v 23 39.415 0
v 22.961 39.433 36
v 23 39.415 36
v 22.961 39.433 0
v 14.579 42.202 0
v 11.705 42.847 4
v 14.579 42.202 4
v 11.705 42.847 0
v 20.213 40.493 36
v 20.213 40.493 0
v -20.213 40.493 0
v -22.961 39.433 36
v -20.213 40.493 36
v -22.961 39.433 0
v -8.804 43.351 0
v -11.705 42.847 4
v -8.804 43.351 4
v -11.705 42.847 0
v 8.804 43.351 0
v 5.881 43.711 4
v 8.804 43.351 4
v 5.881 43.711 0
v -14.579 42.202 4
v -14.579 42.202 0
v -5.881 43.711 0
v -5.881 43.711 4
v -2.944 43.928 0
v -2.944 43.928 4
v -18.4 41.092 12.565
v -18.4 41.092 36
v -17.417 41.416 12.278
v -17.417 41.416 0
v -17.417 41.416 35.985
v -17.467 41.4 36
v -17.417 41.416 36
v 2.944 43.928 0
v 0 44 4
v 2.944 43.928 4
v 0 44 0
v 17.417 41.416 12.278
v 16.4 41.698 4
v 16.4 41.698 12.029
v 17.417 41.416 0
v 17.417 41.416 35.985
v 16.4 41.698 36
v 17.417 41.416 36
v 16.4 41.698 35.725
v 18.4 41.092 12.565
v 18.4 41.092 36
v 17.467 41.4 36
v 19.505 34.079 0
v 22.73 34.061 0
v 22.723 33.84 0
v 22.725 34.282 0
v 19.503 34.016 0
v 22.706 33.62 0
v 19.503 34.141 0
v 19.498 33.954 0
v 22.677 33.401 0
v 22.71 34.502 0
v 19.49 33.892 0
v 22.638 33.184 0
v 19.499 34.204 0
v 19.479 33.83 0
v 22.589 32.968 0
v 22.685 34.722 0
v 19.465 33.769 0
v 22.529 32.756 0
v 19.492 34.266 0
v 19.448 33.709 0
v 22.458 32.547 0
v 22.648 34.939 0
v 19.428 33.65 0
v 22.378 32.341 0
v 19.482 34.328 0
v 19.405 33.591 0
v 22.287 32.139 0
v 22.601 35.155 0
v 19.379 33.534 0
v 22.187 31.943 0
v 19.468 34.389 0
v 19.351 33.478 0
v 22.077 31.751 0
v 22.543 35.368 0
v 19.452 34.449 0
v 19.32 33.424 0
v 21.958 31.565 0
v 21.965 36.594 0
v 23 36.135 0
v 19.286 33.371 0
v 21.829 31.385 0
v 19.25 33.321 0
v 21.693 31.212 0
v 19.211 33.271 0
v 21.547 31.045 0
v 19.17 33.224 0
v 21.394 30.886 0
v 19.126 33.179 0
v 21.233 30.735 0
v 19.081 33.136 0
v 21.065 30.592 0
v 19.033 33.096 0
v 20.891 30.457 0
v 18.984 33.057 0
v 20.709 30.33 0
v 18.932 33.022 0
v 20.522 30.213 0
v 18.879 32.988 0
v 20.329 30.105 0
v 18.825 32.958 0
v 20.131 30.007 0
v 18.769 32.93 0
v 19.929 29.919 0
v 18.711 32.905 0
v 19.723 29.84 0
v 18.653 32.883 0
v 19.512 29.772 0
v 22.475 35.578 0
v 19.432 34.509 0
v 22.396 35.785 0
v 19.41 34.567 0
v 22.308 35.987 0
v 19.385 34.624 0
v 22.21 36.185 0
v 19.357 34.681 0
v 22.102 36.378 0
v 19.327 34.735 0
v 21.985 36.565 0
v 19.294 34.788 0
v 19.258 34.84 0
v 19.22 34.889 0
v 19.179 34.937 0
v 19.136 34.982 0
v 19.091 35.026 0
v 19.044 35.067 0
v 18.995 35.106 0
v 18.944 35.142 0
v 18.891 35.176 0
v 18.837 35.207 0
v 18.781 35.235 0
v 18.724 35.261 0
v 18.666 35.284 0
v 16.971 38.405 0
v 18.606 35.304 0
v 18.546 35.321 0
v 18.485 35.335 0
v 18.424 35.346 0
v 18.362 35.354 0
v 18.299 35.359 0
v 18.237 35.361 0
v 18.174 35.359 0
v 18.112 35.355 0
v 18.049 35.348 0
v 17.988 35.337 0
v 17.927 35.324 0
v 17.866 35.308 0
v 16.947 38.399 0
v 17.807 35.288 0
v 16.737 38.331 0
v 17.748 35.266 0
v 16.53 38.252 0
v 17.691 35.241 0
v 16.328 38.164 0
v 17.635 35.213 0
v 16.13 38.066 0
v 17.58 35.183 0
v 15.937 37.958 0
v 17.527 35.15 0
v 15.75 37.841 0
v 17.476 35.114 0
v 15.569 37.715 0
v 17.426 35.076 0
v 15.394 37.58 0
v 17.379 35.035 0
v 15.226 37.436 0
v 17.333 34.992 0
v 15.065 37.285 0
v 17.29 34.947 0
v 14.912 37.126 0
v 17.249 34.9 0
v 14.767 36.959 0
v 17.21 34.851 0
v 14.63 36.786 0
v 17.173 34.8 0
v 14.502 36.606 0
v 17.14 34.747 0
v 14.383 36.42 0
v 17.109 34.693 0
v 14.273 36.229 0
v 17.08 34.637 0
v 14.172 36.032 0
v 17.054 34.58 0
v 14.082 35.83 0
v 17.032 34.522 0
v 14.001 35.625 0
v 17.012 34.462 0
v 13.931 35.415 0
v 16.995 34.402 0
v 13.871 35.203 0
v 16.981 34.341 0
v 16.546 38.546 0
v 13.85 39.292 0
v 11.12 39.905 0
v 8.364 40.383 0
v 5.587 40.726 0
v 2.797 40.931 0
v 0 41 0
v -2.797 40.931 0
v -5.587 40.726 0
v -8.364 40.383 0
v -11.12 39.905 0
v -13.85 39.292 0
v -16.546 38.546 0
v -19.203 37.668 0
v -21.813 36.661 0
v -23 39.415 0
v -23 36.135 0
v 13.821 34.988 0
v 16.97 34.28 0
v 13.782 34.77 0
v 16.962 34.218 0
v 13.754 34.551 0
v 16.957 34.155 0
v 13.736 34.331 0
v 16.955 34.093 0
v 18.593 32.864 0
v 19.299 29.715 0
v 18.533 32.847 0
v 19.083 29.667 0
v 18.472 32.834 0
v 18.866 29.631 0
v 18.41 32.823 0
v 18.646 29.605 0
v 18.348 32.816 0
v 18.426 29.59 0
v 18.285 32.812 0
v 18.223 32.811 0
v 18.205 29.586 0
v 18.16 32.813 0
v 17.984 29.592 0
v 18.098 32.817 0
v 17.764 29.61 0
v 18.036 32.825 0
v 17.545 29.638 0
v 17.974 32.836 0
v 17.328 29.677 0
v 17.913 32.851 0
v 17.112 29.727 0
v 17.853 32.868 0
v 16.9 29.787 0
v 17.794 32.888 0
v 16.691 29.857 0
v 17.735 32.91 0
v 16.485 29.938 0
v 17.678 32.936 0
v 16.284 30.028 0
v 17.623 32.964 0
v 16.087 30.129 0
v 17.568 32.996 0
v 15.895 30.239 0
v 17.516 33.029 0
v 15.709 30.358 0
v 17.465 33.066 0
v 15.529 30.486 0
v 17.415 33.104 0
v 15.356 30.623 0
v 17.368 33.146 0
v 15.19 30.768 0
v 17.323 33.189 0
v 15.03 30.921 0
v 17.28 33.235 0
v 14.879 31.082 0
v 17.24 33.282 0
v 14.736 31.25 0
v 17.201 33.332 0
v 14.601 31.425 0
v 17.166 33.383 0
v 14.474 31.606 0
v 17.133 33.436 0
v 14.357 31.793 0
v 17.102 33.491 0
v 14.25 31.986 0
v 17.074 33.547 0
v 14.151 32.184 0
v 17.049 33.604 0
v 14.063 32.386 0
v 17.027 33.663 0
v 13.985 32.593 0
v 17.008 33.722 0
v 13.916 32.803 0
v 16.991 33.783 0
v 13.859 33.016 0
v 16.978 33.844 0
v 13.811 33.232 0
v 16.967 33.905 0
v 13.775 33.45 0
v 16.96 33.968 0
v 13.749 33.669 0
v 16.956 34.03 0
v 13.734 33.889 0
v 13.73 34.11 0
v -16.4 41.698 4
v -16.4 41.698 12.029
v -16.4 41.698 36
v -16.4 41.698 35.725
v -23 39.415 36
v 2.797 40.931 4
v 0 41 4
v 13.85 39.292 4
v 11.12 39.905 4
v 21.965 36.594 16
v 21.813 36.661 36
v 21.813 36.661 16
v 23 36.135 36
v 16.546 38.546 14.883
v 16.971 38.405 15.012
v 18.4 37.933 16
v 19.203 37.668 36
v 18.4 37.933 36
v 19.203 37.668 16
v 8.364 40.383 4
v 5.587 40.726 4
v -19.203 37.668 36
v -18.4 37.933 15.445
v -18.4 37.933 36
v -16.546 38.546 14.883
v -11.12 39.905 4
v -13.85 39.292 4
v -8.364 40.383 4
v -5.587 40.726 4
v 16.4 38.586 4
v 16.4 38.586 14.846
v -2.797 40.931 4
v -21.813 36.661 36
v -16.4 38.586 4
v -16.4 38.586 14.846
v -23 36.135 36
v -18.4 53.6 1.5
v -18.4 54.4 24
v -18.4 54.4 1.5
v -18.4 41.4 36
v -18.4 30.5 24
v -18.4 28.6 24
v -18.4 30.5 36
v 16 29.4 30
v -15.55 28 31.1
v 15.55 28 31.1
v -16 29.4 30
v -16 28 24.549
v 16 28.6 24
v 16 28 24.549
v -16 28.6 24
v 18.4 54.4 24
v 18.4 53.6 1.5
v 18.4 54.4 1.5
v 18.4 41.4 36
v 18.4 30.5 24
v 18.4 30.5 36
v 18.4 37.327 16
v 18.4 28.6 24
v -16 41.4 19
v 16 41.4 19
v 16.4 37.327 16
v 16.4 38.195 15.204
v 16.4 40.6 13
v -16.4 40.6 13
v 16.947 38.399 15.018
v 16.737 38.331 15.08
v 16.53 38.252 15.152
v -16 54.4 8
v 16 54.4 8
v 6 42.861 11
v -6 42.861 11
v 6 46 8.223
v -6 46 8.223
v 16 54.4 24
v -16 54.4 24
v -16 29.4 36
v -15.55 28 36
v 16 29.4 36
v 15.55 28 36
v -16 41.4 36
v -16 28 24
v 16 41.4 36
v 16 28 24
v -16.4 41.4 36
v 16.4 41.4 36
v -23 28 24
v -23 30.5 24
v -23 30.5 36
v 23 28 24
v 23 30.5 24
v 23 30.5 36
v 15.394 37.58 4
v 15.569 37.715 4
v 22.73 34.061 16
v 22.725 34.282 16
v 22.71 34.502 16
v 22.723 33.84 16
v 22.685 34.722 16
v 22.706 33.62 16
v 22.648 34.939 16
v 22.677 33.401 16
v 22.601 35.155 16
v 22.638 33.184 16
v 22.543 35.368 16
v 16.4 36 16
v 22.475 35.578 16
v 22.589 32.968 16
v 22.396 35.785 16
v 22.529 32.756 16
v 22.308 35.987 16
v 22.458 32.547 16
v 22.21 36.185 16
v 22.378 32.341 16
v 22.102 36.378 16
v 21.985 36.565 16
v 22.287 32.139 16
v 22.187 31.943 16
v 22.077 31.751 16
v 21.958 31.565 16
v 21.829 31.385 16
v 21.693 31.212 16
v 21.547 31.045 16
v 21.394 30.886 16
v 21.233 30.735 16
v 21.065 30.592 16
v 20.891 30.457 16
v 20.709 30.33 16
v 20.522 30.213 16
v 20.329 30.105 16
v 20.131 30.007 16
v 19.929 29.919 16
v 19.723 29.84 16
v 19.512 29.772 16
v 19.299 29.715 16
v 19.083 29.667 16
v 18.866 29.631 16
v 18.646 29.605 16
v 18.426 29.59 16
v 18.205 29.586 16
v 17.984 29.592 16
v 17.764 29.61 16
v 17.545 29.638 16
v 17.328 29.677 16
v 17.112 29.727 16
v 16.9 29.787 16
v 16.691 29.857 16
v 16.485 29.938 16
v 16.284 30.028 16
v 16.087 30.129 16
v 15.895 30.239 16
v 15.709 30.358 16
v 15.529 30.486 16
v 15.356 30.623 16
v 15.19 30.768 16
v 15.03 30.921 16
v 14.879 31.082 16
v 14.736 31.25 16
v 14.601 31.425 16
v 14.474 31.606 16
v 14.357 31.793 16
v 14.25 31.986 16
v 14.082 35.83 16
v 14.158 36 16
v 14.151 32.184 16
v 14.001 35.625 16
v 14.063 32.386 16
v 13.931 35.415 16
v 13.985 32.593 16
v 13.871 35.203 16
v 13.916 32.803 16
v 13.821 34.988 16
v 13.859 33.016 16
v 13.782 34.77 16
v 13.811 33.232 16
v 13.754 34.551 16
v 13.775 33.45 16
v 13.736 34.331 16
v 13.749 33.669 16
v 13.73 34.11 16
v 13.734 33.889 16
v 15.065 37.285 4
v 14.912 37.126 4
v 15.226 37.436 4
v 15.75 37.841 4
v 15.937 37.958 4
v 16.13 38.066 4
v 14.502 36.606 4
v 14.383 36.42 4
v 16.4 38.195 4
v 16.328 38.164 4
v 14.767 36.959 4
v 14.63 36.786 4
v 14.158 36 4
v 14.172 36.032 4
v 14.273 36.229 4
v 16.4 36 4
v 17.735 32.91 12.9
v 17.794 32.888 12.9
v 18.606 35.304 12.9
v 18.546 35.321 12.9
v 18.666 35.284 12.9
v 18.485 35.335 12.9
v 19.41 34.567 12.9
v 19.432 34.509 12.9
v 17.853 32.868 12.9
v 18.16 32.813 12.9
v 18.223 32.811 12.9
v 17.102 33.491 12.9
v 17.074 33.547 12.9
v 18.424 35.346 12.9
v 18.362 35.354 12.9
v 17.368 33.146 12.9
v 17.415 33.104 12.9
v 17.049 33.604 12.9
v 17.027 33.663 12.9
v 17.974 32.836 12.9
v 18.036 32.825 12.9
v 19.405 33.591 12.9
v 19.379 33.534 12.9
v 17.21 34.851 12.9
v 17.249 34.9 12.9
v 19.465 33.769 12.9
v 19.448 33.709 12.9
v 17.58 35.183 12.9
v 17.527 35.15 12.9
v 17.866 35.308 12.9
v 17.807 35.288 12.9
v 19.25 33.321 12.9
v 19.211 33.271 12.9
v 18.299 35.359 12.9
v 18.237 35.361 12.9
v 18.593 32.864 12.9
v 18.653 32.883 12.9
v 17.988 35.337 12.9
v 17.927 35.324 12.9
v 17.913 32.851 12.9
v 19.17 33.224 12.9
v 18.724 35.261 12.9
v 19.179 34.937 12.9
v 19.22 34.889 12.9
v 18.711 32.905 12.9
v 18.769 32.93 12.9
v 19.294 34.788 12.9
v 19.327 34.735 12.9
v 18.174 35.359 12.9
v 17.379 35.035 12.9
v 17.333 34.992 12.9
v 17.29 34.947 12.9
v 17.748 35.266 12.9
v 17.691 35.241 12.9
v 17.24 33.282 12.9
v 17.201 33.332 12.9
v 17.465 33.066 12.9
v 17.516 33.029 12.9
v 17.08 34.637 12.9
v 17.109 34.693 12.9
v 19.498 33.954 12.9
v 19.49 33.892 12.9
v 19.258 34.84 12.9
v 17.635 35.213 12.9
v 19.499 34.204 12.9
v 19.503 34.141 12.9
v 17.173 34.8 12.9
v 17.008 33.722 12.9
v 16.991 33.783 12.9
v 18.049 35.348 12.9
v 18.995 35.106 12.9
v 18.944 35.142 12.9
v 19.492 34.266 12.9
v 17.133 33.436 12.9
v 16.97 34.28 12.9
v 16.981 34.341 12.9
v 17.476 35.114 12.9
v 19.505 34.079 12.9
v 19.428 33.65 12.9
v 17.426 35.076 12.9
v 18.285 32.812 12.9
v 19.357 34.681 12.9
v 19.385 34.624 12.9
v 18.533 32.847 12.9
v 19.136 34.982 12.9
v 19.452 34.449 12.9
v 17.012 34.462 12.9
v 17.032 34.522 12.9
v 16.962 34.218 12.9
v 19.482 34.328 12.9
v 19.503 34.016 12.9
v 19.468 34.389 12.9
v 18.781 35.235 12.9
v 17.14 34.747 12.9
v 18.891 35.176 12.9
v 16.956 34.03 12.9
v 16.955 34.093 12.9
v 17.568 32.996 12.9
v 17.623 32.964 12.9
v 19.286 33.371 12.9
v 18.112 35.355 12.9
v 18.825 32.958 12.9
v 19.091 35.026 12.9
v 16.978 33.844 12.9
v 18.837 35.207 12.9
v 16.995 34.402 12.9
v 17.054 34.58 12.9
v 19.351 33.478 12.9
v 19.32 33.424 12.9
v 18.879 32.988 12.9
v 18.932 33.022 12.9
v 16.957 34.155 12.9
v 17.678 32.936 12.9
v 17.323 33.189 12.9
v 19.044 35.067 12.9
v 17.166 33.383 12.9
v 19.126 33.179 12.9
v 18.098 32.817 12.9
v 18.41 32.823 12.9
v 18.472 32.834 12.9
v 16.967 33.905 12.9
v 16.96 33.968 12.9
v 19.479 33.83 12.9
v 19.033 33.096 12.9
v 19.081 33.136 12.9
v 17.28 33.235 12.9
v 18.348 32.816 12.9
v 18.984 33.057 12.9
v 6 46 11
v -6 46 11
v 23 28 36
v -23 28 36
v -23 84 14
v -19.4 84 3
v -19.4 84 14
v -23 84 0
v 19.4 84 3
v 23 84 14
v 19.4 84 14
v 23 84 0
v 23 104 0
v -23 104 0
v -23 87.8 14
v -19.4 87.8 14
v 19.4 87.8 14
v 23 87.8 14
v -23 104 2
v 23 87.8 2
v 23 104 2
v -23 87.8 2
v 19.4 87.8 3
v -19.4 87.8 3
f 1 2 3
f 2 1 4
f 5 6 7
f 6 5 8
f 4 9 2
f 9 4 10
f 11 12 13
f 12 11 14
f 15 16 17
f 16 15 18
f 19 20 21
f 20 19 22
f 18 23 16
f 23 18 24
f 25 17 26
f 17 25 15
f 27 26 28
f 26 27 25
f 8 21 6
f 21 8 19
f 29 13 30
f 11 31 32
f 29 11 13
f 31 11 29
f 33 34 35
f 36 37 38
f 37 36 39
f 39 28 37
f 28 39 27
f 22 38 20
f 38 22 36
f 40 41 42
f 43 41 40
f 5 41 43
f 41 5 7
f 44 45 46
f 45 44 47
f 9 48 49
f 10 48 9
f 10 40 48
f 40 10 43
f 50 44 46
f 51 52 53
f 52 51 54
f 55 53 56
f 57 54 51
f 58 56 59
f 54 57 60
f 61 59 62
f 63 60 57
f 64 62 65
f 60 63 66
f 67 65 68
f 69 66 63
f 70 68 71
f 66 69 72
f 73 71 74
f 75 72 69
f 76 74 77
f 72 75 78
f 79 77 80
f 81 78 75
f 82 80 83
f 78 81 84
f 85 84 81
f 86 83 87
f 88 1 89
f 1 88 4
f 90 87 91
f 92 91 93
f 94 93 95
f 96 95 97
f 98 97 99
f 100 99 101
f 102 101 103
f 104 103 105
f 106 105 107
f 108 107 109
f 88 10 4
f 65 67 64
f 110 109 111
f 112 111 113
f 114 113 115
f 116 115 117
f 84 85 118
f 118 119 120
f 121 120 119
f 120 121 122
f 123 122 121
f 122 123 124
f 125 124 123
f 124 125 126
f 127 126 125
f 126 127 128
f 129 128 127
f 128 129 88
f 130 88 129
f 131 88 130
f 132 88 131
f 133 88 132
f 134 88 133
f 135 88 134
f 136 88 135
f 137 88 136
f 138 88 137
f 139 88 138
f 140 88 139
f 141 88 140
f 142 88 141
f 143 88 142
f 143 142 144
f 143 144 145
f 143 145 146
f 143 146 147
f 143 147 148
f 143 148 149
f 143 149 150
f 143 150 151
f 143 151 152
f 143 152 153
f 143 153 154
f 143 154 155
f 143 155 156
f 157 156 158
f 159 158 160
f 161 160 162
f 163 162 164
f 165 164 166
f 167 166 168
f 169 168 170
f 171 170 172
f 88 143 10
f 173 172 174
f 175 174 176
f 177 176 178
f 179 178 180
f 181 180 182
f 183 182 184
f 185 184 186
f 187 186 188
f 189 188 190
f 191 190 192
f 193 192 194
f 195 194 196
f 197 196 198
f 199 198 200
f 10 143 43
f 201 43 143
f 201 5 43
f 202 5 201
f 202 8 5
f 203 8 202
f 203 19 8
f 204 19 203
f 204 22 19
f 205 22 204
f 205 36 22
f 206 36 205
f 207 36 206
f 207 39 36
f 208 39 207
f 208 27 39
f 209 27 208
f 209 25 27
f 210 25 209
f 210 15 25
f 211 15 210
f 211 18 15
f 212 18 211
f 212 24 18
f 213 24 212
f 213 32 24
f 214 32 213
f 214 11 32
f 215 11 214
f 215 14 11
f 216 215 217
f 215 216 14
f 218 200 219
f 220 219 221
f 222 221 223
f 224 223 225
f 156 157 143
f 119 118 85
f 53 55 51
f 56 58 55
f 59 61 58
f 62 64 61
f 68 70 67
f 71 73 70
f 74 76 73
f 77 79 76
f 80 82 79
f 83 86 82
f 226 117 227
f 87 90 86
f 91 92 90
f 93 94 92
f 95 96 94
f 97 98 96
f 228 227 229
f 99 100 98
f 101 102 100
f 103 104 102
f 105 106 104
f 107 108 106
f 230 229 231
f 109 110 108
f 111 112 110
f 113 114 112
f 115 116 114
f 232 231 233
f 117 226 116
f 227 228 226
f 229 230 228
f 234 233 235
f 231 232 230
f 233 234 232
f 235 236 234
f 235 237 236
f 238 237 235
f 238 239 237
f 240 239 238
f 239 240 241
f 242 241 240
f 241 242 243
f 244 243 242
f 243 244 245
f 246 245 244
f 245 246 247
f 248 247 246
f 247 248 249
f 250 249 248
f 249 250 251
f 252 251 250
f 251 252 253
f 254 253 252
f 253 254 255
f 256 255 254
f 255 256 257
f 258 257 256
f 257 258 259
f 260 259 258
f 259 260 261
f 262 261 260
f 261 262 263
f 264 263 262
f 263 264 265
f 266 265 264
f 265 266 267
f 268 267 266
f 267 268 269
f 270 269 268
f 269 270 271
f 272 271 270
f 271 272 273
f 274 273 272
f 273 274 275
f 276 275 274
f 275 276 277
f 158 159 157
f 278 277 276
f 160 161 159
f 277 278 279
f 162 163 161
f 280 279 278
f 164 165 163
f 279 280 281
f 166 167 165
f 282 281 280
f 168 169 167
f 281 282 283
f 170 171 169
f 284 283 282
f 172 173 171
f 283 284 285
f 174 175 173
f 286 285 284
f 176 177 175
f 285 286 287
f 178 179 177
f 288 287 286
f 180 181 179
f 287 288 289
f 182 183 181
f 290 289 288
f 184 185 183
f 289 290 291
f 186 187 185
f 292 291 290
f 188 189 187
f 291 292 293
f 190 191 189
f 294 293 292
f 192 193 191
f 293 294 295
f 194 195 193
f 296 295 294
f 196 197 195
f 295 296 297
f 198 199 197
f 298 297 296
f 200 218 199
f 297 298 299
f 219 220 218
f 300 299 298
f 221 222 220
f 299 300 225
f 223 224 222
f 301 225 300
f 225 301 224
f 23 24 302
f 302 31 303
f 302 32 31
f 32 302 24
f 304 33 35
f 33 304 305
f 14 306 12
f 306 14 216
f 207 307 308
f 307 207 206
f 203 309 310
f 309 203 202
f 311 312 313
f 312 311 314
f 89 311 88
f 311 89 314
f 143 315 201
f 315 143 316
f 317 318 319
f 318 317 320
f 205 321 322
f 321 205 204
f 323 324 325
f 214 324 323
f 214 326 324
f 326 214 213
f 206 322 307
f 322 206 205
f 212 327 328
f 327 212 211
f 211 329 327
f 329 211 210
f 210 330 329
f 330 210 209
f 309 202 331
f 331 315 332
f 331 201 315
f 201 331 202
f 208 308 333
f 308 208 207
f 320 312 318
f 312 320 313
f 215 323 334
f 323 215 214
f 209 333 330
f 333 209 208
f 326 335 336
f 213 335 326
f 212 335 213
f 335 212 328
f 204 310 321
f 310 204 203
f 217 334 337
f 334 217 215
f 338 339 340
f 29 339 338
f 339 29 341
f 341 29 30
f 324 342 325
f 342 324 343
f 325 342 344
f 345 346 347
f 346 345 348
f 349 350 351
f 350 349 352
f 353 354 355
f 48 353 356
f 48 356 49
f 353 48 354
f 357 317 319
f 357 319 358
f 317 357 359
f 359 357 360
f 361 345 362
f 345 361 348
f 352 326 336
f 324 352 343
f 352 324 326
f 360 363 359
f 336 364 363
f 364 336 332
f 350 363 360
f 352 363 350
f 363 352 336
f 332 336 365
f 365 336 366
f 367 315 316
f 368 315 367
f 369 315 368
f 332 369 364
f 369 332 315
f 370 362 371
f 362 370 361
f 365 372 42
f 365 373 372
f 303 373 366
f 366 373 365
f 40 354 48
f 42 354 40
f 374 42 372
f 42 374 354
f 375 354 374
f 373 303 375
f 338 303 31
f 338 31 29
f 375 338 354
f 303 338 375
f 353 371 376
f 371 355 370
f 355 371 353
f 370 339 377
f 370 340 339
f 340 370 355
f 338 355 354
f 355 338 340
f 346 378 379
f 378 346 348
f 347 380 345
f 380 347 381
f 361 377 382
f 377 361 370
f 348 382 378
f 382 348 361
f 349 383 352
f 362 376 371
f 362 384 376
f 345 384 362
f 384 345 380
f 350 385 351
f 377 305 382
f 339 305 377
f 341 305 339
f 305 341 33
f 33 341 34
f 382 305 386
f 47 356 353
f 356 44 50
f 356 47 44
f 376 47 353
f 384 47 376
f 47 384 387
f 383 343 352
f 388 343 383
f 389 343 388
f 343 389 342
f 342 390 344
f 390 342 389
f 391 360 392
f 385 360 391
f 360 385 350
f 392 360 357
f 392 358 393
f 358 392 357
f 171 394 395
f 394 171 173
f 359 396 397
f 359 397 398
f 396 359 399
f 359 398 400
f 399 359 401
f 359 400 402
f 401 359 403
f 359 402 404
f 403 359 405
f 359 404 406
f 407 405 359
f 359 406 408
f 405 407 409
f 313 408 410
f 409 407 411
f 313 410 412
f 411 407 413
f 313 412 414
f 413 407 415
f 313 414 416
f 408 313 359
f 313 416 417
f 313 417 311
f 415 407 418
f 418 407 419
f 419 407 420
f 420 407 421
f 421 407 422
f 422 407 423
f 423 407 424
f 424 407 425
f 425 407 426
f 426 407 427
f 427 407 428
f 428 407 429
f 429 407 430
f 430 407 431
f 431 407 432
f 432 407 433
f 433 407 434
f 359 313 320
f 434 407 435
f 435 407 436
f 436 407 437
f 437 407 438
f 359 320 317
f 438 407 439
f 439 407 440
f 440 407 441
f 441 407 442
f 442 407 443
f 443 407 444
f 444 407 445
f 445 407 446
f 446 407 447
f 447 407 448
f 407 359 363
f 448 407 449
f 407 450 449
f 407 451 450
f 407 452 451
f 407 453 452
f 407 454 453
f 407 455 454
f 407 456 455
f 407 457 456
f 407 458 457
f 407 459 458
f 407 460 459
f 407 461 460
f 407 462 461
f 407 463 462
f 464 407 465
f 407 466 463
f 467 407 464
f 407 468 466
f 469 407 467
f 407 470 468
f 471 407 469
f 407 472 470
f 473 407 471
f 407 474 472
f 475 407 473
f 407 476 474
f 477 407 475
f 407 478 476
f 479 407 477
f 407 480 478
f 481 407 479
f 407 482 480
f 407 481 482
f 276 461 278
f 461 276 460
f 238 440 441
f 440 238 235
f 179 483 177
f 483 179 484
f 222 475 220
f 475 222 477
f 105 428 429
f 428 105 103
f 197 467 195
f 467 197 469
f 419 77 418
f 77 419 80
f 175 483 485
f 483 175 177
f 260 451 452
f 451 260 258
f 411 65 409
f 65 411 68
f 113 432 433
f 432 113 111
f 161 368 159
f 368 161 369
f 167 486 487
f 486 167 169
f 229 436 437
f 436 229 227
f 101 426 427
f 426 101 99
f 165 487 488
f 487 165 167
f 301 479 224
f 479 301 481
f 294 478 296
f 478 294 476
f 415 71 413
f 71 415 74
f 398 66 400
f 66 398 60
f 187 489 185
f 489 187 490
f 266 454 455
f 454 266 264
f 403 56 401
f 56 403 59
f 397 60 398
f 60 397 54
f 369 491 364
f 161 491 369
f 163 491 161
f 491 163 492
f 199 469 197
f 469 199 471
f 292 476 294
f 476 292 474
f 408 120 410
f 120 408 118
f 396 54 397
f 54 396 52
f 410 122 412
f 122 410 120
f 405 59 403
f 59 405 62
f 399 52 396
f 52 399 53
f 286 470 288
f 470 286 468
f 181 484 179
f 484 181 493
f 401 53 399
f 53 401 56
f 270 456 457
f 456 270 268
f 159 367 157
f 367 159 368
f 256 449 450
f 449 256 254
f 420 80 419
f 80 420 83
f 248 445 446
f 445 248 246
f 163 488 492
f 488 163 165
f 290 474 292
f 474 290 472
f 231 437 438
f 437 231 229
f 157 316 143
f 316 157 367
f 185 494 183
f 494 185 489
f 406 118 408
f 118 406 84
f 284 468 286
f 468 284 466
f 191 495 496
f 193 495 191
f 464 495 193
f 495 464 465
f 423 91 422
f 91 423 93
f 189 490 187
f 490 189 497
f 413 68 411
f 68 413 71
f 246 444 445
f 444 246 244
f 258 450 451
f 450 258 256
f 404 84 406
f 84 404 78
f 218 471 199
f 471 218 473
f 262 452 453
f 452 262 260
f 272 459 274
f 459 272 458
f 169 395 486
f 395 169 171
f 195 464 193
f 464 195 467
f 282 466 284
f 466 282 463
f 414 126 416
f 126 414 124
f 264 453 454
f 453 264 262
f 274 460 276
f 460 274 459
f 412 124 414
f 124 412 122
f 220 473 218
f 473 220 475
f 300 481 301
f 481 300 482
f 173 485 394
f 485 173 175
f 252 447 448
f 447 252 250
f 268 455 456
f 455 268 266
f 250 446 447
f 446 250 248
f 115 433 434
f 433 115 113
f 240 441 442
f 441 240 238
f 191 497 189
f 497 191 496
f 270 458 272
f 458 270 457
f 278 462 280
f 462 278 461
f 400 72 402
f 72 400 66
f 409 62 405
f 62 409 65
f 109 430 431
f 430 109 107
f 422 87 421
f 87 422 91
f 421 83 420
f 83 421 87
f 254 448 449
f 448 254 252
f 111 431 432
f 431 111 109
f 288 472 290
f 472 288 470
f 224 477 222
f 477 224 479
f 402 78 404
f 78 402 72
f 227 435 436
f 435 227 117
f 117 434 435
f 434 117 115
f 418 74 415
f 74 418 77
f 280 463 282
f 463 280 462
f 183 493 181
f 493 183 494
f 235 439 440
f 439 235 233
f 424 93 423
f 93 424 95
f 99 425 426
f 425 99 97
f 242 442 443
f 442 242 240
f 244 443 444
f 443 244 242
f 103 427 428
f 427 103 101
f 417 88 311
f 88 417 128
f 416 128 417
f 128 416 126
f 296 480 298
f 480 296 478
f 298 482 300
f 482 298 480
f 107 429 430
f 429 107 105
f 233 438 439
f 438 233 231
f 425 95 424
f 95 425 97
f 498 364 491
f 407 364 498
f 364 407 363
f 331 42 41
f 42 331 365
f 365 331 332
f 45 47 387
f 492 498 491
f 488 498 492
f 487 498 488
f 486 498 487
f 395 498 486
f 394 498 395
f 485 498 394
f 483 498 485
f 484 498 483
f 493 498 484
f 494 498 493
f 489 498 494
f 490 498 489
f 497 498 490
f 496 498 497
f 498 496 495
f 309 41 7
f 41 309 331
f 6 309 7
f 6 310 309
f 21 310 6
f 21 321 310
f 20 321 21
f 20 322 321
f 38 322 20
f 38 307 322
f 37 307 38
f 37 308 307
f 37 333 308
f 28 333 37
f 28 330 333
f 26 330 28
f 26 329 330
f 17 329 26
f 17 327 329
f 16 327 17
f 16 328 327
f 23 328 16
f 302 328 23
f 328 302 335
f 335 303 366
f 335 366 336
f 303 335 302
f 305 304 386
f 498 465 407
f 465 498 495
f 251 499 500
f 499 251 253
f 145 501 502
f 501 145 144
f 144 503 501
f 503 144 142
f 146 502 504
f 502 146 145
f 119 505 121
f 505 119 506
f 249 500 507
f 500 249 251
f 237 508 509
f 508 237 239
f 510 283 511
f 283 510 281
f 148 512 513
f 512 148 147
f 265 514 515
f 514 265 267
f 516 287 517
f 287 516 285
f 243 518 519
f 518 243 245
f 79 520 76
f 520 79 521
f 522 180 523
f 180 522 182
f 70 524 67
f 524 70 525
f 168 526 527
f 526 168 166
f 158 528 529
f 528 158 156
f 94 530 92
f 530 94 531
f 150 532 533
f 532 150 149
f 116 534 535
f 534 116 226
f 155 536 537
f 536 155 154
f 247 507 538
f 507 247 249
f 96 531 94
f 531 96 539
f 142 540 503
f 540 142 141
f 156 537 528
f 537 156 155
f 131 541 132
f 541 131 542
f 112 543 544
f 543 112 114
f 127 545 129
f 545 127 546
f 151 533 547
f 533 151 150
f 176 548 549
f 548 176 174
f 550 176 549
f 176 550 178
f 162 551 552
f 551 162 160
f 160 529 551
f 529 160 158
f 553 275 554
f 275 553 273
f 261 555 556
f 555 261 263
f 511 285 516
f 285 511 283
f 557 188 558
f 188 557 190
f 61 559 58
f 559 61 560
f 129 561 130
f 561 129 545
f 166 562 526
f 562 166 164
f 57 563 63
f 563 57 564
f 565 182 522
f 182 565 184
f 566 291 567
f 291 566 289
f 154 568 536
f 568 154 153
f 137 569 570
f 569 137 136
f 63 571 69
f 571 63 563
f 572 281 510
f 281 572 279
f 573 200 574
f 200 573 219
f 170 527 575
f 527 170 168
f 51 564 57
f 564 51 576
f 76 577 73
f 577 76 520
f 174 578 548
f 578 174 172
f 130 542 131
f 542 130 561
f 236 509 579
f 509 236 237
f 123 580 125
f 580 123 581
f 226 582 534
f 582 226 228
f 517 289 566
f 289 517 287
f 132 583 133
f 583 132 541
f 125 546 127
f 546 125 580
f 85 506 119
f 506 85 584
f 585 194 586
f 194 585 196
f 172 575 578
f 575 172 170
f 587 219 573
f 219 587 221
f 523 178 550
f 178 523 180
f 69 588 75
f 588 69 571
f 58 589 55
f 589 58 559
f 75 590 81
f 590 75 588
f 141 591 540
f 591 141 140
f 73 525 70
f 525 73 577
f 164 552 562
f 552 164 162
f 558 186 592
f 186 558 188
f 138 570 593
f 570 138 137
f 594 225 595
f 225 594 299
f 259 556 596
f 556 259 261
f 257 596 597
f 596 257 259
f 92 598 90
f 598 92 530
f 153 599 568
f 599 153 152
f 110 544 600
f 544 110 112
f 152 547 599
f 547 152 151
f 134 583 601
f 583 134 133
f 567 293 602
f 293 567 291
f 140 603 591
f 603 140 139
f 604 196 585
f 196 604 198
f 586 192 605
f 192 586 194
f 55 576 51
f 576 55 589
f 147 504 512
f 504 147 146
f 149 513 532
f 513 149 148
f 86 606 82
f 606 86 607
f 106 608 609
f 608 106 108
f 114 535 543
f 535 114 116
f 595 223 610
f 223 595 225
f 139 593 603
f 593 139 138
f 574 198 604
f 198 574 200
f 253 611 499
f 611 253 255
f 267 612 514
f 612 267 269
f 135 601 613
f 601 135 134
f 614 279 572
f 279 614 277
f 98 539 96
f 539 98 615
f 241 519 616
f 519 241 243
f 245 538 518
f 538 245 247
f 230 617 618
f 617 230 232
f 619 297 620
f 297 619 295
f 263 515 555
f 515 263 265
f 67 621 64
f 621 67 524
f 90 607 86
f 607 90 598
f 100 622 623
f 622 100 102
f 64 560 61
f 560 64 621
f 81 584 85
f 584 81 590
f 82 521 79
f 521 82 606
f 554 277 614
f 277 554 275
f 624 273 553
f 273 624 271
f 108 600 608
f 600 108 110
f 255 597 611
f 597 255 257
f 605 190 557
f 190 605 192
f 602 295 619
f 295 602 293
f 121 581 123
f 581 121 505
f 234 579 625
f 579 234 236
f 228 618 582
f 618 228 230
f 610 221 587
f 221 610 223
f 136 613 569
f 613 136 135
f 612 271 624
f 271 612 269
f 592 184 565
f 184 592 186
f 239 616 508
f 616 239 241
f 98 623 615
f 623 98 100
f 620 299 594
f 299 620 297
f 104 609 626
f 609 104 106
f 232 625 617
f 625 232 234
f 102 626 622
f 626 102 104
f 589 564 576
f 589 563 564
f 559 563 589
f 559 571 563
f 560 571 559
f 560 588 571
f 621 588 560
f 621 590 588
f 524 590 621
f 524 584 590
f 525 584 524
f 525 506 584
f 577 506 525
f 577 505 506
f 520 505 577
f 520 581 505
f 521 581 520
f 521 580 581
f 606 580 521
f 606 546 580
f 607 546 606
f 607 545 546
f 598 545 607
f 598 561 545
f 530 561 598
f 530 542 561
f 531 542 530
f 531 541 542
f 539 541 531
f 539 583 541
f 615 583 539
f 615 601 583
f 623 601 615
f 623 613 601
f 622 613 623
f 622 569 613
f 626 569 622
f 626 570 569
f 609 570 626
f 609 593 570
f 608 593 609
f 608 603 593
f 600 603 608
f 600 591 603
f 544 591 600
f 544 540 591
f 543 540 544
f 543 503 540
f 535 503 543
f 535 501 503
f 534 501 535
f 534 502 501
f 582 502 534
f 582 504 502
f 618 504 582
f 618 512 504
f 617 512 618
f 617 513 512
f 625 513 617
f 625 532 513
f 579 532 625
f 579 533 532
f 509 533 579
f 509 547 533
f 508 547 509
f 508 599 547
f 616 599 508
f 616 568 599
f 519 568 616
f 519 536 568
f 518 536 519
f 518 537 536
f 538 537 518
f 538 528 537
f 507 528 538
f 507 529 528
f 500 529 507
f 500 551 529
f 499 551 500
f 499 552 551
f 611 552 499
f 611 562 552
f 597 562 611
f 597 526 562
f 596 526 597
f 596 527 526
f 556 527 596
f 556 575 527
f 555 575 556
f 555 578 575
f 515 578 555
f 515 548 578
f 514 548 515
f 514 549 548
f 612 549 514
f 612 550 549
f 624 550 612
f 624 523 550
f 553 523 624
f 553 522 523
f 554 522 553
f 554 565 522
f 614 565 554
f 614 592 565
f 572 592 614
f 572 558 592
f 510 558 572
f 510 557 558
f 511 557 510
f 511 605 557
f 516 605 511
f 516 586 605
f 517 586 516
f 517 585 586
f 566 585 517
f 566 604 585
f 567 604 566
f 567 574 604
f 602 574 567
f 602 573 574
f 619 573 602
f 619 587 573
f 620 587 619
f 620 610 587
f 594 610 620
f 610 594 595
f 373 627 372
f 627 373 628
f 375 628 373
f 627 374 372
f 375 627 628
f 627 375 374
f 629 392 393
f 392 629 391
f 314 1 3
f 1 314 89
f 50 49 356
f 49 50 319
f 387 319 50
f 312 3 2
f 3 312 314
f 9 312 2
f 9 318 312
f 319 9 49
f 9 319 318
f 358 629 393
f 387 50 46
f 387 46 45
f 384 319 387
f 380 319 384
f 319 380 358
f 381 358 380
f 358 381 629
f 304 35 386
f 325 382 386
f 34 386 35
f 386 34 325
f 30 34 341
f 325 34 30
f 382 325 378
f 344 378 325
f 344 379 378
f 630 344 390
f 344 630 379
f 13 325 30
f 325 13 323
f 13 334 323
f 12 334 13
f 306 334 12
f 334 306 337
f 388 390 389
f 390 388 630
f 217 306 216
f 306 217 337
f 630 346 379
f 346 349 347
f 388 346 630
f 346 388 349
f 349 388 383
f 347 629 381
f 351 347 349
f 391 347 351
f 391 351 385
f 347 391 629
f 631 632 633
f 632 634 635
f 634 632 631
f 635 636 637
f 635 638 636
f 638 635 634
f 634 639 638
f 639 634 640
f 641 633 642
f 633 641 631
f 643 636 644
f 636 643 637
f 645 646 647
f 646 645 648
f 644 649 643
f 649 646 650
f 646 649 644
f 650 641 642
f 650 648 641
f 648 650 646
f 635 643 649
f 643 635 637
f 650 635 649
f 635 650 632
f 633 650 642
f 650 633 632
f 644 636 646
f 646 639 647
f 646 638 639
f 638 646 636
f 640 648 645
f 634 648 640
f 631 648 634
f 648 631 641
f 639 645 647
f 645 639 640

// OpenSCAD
// file: part_f3_catch_tray.scad
// ============================================================================
// v3 PART F3 — catch tray, mouth flush with the chute walls
//
// The mouth wall is cut down so the chute lip overhangs into the well with no
// step for a tablet to catch on. Free-standing: lift it out to take the dose.
// Its flat floor is the camera's pill-count zone, so keep it matte.
// ============================================================================

include <parameters_v3.scad>;
include <lib_v3.scad>;

$fn = 64;

corner_r = 6.0;

module f3_shell(inset, h, z0) {
    x = tray_w - 2 * inset;
    y = tray_l - 2 * inset;
    translate([0, tray_y0 + tray_l / 2, z0])
        hull() for (ix = [-1, 1], iy = [-1, 1])
            translate([ix * (x / 2 - corner_r), iy * (y / 2 - corner_r), 0])
                cylinder(h = h, r = corner_r);
}

module catch_tray_v3() {
    difference() {
        f3_shell(0, tray_h, base_z);
        f3_shell(tray_floor + 1.8, tray_h, base_z + tray_floor);
        // Cut the mouth wall down to clear the chute lip.
        translate([-(chute_win_w / 2 + 3), tray_y0 - 1, base_z + tray_mouth_h])
            cube([chute_win_w + 6, 6, tray_h]);
    }
}

translate([0, 0, -base_z]) catch_tray_v3();

echo(str("F3 tray: ", tray_w, " x ", tray_l, " x ", tray_h,
         ", mouth wall ", tray_mouth_h, " mm vs chute lip at z ",
         chute_stations[len(chute_stations) - 1][1]));
// file: part_b3_base_body.scad
// ============================================================================
// v3 PART B3 — base body (lower): electronics bay + integral 45 deg chute
//
// Splitting the housing here is what makes both halves printable: this one goes
// open-end-down, so the chute floor and the wall notch are all self-supporting.
//
// The ramp is one continuous surface from under the deck's wedge to the lip over
// the tray: the stations are hulled in sequence, and the notch through the wall
// is cut with its sill on the ramp line so it never breaches the floor.
// ============================================================================

include <parameters_v3.scad>;
include <lib_v3.scad>;

$fn = 128;

n_st = len(chute_stations);

module b3_floor_station(st) {
    w = st[2] + 2 * chute_wall;
    translate([-w / 2, st[0] - 0.4, st[1] - st[4]])
        cube([w, 0.8, st[4]]);
}

module b3_wall_station(st, side) {
    h = max(0.8, st[3] - st[1]);
    mirror([side < 0 ? 1 : 0, 0, 0])
        translate([st[2] / 2, st[0] - 0.4, st[1]]) cube([chute_wall, 0.8, h]);
}

// The ramp, as one continuous surface from under the deck's wedge to the lip.
module b3_chute_floor() {
    for (i = [0 : n_st - 2]) hull() {
        b3_floor_station(chute_stations[i]);
        b3_floor_station(chute_stations[i + 1]);
    }
}

module b3_chute_walls() {
    for (i = [0 : n_st - 2], s = [-1, 1]) hull() {
        b3_wall_station(chute_stations[i], s);
        b3_wall_station(chute_stations[i + 1], s);
    }
}

// The notch is a box MINUS the chute itself, so it can only ever remove housing
// wall — the ramp and the chute's side walls survive whatever the box does.
// A plain box (the first attempt) sliced the ramp out exactly where it passes
// through the wall and left a hole a tablet dropped through. Putting the box's
// sill on the ramp line closed the hole but made the cut coplanar with the
// ramp's own top surface, which is fragile; subtracting the chute is exact.
module b3_wall_notch(w, z0, z_top) {
    difference() {
        translate([-w / 2, h_ri - 5, z0])
            cube([w, (h_od / 2 + 4) - (h_ri - 5), z_top - z0]);
        b3_chute_floor();
        b3_chute_walls();
    }
}

// Shoulder fins tying the chute back into the bore. They also stiffen the wall
// either side of the notch. Below the deck, so they cannot foul the carousel.
module b3_shoulder(side) {
    st = chute_stations[1];
    mirror([side < 0 ? 1 : 0, 0, 0])
        intersection() {
            translate([st[2] / 2, st[0] - 1.5, st[1] - st[4]])
                cube([30, 3.0, st[3] - st[1] + st[4]]);
            cylinder(h = deck_z, d = h_id + wall);   // buried in the wall, no coplanar faces
        }
}

module b3_ear() {
    hull() {
        translate([h_od / 2 - 2, -ear_w / 2, deck_z - ear_t]) cube([ear_out + 2, ear_w, ear_t]);
        translate([h_od / 2 - 2, -ear_w / 2, deck_z - ear_t - 2]) cube([2, ear_w, 2]);
    }
}

module base_body_v3() {
    difference() {
        union() {
            tube(h_od, h_id, deck_z);

            // Chute: continuous ramp plus side walls sealing up to the deck.
            b3_chute_floor();
            b3_chute_walls();

            for (s = [-1, 1]) b3_shoulder(s);

            // Base-cover posts, grown from the build plate.
            for (a = post_angles)
                rotate([0, 0, a]) translate([post_r, 0, 0])
                    cylinder(h = 16, d = post_d);

            for (a = ear_angles) rotate([0, 0, a]) b3_ear();
        }

        b3_wall_notch(chute_win_w, chute_win_z0, chute_win_z1);

        // Trim anything above the split plane.
        translate([0, 0, deck_z]) cylinder(h = 60, d = h_od + 20);

        for (a = post_angles)
            rotate([0, 0, a]) translate([post_r, 0, -0.1])
                cylinder(h = 13, d = m3_pilot_d);

        for (a = ear_angles)
            rotate([0, 0, a])
                translate([h_od / 2 + ear_out / 2, 0, deck_z - ear_t - 0.1])
                    cylinder(h = ear_t + 0.2, d = m3_pilot_d);

        rotate([0, 0, 180])
            translate([-cable_w / 2, -(h_od / 2 + 2), 5])
                cube([cable_w, wall + 4, cable_h]);
    }
}

base_body_v3();

echo(str("B3 base body: height ", deck_z, ", bay clear height ",
         chute_stations[n_st - 2][1] - chute_wall));
echo(str("B3 chute exit: ", chute_stations[n_st - 1][2], " mm wide at z ",
         chute_stations[n_st - 1][1]));
// file: lib_v3.scad
// ============================================================================
// Shared geometry helpers for the v3 print set.   include <lib_v3.scad>;
// ============================================================================

// Wedge prism, centred on +X, spanning +/- ang/2, rising from z = 0.
module sector_prism(r, ang, h, seg = 64) {
    steps = max(4, ceil(ang / 2.5));   // ~2.5 deg chords, independent of ang
    linear_extrude(height = h)
        polygon(concat(
            [[0, 0]],
            [for (i = [0 : steps])
                let (a = -ang / 2 + ang * i / steps) [r * cos(a), r * sin(a)]]
        ));
}

// Annular sector prism, centred on +X, rising from z = 0.
module ring_sector(r_in, r_out, ang, h, seg = 64) {
    difference() {
        sector_prism(r_out, ang, h, seg);
        translate([0, 0, -0.05]) cylinder(h = h + 0.1, r = r_in, $fn = seg);
    }
}

module tube(od, id, h) {
    difference() {
        cylinder(h = h, d = od);
        translate([0, 0, -0.05]) cylinder(h = h + 0.1, d = id);
    }
}

// Inward ledge with a 45 deg self-supporting underside. Top face at z_top.
module chamfered_ledge(r_wall, w, z_top) {
    rotate_extrude(convexity = 4)
        polygon([[r_wall - w, z_top],
                 [r_wall,     z_top],
                 [r_wall,     z_top - w]]);
}

// Thin slab used as a hull station for the chute trough.
module station_slab(y, z, w, t = 0.6) {
    translate([-w / 2, y - t / 2, z]) cube([w, t, 0.6]);
}
// main file
// ============================================================================
// v3 COUPON C3 — chute lip to tray mouth
//
// Print this before B3 and F3. About 20 minutes to prove the dock, which is the
// last place a dose can be lost and the one place two separately printed parts
// have to line up without a step.
//
// Two pieces, cut from the real parts:
//   1. Chute exit — the last stretch of ramp, its side walls, the lip, and the
//      housing wall around the notch.
//   2. Tray mouth — the cut-down mouth wall and the strip of tray floor behind
//      it.
//
// What to look for:
//   1. Butt the tray piece up to the chute piece as they sit in the assembly.
//      The lip must overhang *into* the tray, past the mouth wall.
//   2. There must be clearance between the lip's underside and the top of the
//      mouth wall — 1.5 mm by design. It must not be so tight that the tray
//      cannot be lifted straight up, and not so open that a tablet on edge could
//      stand in the gap.
//   3. Roll a tablet and then a capsule down the ramp. Each must clear the lip
//      and land on the tray floor. Nothing should stop on the lip, catch on the
//      mouth wall, or bridge the two.
//   4. Look along the ramp against the light: the floor must be unbroken all the
//      way through the wall. This is the same thing check_drop_path.scad proves
//      in CAD; here you prove it in plastic.
//
// Print as laid out, no supports. The chute piece keeps its as-modelled
// orientation, so its ramp underside prints as the same 40-42 deg overhang it
// will have on the real part — which is also worth a look.
// ============================================================================

include <parameters_v3.scad>;
include <lib_v3.scad>;
use <part_b3_base_body.scad>;
use <part_f3_catch_tray.scad>;

$fn = 96;

exit_y0   = 44.0;                    // back far enough to include real ramp
exit_z1   = 36.0;                    // above this it is just drum band, which
                                     // proves nothing and costs 18 mm of wall
exit_x    = 46.0;                    // chute plus the wall either side
mouth_len = 22.0;                    // strip of tray kept behind the mouth wall
gap       = 16.0;

module c3_chute_piece() {
    intersection() {
        base_body_v3();
        translate([-exit_x / 2, exit_y0, -1])
            cube([exit_x, (h_od / 2 + 12) - exit_y0, exit_z1 + 1]);
    }
}

module c3_tray_piece() {
    intersection() {
        catch_tray_v3();
        translate([-exit_x / 2, tray_y0 - 2, base_z - 1])
            cube([exit_x, mouth_len, tray_h + 2]);
    }
}

// Both as modelled, dropped to the bed, and pulled apart in Y so they print
// clear of each other.
translate([0, -gap, 0]) c3_chute_piece();
translate([0, gap, -base_z]) c3_tray_piece();

echo(str("C3 dock: lip floor top z ",
         chute_stations[len(chute_stations) - 1][1],
         ", lip underside z ",
         chute_stations[len(chute_stations) - 1][1]
             - chute_stations[len(chute_stations) - 1][4],
         ", mouth wall top z ", base_z + tray_mouth_h));
